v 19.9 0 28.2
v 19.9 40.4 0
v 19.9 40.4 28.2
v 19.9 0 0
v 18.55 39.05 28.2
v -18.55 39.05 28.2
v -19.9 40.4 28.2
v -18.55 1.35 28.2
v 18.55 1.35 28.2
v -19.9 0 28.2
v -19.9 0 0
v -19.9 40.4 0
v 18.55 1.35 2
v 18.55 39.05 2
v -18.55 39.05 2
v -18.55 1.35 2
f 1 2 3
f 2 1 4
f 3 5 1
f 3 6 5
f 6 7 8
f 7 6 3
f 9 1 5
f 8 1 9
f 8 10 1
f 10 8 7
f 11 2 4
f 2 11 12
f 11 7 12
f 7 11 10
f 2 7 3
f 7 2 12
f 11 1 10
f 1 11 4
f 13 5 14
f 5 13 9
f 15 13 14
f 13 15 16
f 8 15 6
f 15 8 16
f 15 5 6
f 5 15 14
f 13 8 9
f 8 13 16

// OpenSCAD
// file: lunchbox.params.scad
// SPDX-FileCopyrightText: 2026 Alon A. Rabinowitz
// SPDX-License-Identifier: CC-BY-SA-4.0
// A remix of LunchBox by GekoPrime (https://www.printables.com/model/468166), CC BY-SA 4.0.

/*
Everything you SET for the LunchBox remix. Render lunchbox.scad, not this file.

The LunchBox is a carbon + HEPA scrubber. Air enters the grid on the body's front and passes the HEPA paper,
then the carbon bed between two perforated walls. It goes down a channel at the back to the fan section
underneath, whose fans blow it out at the front. This remix adds, for a build with two 40 x 40 x 20 fans
(Delta EFB0412VHD):

  insert      a drop-in section between the body and the fan section, holding a flat filter sheet that
              stops carbon dust reaching the fans. It mates with the unmodified parts on both faces.
  gaskets     flat TPU, one for the lid joint and one for each joint at the fans.
  blank       closes the fan section's middle bay.
  tabs        two per short end at every joint, clamped with an M3 screw and a nut in a side slot. The
              body, the lid and the fan section get them added to the original STLs.

COORDINATES are the box as it stands: X along its length, Y from the front (the grid, where air comes in)
to the back, Z up, with Z = 0 at the joint between the body and the fan section. X is centred.

The original's STLs use a different frame (Z points down, Y from the front towards -Y) and are not in
this repository; lunchbox.layout.scad maps them into this one. Download them from the Printables page into
original/ - see the README there.
*/

/* [Which part] */
part = "insert";   /* "insert", "gasket-lid", "gasket-fans", "blank", "body", "lid" or "fans". The last three are the originals with tabs added, and need original/. lunchbox-assembly.scad shows them together. */
insert_tabs = true;   /* false makes the insert a plain drop-in, for a LunchBox built without tabs. */
/* [The original LunchBox - measured by sectioning its STLs, 6-7 Oct 2026] */
// All MEASURED: horizontal sections of filter_caddy_110x74x21.stl (the body), filter_lid_110x74x21.stl and
// axial_fan_caddy_40x28.stl (the fan section), read to 0.1 mm. The originals agree with each other to that
// precision (the outlines are identical), so the numbers are the author's design values.
lb_l    = 124;      /* Outside length (X). */
lb_d    = 60;       /* Outside depth (Y). */
lb_r    = 2;        /* The outline's corner radius. */
lb_wall = 2;        /* The body's wall; the lid's plug fills the inside of it, 120 x 56. */
body_h  = 117.43;   /* The body, from the fan joint to the lid joint. */
lid_t   = 2;        /* The lid's plate. Its plug, lid_t more, sits inside the body's top. */
lid_screw_ys = [5, 55];   /* The lid's own two screws, at X = 0. They stay. */
groove_w = 2.6;     /* The channel in the body's bottom face, inside its wall, that the fan section's lip seats in... */
groove_h = 2;       /* ...and its depth. */
hepa_hw  = 55;      /* The HEPA holder's opening in the body's bottom face: X +/-55, from the wall to Y = hepa_y1. */
hepa_y1  = 23;
cap_y1   = 41.1;    /* The carbon bed's floor, at the body's bottom face, ends here; behind it is the channel that takes the air down to the fans. */
fans_h   = 44.6;    /* The fan section, from its bottom to the rim the body sits on. Its lip stands groove_h higher. */
fans_floor = 4;     /* The fan section's floor, under the fans. */
fan_slot_hw = 60.3; /* The slot the three fans stand in, side by side: X +/-60.3 ... */
fan_slot_y1 = 30.6; /* ...from the front wall (Y = lb_wall) to here, where the walls step in. Behind it, the plenum with its curved floor. */
plenum_hw   = 58;   /* The plenum's opening in the rim, X +/-58, from fan_slot_y1 to lip_back_y0. */
lip_t_side  = 1.7;  /* The fan section's lip: along each side, X 58 to 59.7, from fan_slot_y1 back... */
lip_back_y0 = 55.7; /* ...and across the back, Y 55.7 to 57.7, its two outer corners rounded to lb_r. It rises groove_h above the rim. */
lip_t_back  = 2;

/* [The insert and its filter sheet] */
sheet_t  = 5;       /* The space the sheet lies in. Polyester filter floss, about 5 mm loose; it is not compressed. */
plenum_h = 5;       /* Free air above the sheet: the channel is only 14 mm deep, and this lets its air spread forward over the whole sheet. */
grid_t   = 2;       /* The grid the sheet lies on. */
grid_pitch = 10;    /* Ribs along Y, this far apart; two more ribs cross them along X. */
grid_beads = 2;     /* Each rib is this many beads wide. */
ledge_beads = 3;    /* A ledge round the cavity at the grid's level: the ribs end on it, and the sheet's edges seal on it. */

/* [The gaskets - TPU] */
gasket_t = 1.0;     /* Five layers. Every joint's stack height counts it, uncompressed. */

/* [The tabs and their screws] */
tab_ys    = [15, 45];   /* The two tabs on each short end, by Y. Alon, Q81, 7 Oct 2026: two per side. */
tab_l     = 9;      /* How far a tab stands out from the end wall. */
tab_w     = 10;     /* Its width, along Y. */
tab_t     = 6;      /* Its height, on the body and the fan section. The lid's tab is the lid's plate. */
tab_axis  = 4.5;    /* The screw, this far out from the end wall: the nut's slot then stops about 1 mm short of it. */
screw_d   = 3.0;    /* M3. */
nut_af    = 5.5;    /* The M3 hex nut, across its flats - ISO 4032... */
nut_h     = 2.4;    /* ...and its height, the largest allowed. */
nut_fit   = 0.15;   /* The nut's side slot, per side, on top of fdm_hole_comp: the nut slides in and the screw holds it. */
screw_tip = 1.5;    /* A screw must stand this far out of its nut. */
screw_lengths = [8, 10, 12, 16, 20, 25, 30, 35, 40];   /* M3 lengths to choose from. */

/* [The blank for the middle bay] */
blank_fit = 0.2;    /* Less than the bay, per side, in X and in depth. The fans beside it are 40 mm on the nose. */
blank_face = 2;     /* Its front face, which closes the bay. */
blank_beads = 3;    /* Its side walls. */

/* [Printing - mirrors the print profile; scad-check.sh compares the first two with the slicer's] */
fdm_layer_h     = 0.2;
fdm_extrusion_w = 0.45;
fdm_hole_comp   = 0.15;   /* Added to every hole's radius - fdm-design-rules section 2. Not cross-checked. */
// main file
// SPDX-FileCopyrightText: 2026 Alon A. Rabinowitz
// SPDX-License-Identifier: CC-BY-SA-4.0
// A remix of LunchBox by GekoPrime (https://www.printables.com/model/468166), CC BY-SA 4.0.

// The blank for the fan section's middle bay, on its own: everything is in lunchbox.scad, and this file only pins the part.
include <lunchbox.scad>
part = "blank";
